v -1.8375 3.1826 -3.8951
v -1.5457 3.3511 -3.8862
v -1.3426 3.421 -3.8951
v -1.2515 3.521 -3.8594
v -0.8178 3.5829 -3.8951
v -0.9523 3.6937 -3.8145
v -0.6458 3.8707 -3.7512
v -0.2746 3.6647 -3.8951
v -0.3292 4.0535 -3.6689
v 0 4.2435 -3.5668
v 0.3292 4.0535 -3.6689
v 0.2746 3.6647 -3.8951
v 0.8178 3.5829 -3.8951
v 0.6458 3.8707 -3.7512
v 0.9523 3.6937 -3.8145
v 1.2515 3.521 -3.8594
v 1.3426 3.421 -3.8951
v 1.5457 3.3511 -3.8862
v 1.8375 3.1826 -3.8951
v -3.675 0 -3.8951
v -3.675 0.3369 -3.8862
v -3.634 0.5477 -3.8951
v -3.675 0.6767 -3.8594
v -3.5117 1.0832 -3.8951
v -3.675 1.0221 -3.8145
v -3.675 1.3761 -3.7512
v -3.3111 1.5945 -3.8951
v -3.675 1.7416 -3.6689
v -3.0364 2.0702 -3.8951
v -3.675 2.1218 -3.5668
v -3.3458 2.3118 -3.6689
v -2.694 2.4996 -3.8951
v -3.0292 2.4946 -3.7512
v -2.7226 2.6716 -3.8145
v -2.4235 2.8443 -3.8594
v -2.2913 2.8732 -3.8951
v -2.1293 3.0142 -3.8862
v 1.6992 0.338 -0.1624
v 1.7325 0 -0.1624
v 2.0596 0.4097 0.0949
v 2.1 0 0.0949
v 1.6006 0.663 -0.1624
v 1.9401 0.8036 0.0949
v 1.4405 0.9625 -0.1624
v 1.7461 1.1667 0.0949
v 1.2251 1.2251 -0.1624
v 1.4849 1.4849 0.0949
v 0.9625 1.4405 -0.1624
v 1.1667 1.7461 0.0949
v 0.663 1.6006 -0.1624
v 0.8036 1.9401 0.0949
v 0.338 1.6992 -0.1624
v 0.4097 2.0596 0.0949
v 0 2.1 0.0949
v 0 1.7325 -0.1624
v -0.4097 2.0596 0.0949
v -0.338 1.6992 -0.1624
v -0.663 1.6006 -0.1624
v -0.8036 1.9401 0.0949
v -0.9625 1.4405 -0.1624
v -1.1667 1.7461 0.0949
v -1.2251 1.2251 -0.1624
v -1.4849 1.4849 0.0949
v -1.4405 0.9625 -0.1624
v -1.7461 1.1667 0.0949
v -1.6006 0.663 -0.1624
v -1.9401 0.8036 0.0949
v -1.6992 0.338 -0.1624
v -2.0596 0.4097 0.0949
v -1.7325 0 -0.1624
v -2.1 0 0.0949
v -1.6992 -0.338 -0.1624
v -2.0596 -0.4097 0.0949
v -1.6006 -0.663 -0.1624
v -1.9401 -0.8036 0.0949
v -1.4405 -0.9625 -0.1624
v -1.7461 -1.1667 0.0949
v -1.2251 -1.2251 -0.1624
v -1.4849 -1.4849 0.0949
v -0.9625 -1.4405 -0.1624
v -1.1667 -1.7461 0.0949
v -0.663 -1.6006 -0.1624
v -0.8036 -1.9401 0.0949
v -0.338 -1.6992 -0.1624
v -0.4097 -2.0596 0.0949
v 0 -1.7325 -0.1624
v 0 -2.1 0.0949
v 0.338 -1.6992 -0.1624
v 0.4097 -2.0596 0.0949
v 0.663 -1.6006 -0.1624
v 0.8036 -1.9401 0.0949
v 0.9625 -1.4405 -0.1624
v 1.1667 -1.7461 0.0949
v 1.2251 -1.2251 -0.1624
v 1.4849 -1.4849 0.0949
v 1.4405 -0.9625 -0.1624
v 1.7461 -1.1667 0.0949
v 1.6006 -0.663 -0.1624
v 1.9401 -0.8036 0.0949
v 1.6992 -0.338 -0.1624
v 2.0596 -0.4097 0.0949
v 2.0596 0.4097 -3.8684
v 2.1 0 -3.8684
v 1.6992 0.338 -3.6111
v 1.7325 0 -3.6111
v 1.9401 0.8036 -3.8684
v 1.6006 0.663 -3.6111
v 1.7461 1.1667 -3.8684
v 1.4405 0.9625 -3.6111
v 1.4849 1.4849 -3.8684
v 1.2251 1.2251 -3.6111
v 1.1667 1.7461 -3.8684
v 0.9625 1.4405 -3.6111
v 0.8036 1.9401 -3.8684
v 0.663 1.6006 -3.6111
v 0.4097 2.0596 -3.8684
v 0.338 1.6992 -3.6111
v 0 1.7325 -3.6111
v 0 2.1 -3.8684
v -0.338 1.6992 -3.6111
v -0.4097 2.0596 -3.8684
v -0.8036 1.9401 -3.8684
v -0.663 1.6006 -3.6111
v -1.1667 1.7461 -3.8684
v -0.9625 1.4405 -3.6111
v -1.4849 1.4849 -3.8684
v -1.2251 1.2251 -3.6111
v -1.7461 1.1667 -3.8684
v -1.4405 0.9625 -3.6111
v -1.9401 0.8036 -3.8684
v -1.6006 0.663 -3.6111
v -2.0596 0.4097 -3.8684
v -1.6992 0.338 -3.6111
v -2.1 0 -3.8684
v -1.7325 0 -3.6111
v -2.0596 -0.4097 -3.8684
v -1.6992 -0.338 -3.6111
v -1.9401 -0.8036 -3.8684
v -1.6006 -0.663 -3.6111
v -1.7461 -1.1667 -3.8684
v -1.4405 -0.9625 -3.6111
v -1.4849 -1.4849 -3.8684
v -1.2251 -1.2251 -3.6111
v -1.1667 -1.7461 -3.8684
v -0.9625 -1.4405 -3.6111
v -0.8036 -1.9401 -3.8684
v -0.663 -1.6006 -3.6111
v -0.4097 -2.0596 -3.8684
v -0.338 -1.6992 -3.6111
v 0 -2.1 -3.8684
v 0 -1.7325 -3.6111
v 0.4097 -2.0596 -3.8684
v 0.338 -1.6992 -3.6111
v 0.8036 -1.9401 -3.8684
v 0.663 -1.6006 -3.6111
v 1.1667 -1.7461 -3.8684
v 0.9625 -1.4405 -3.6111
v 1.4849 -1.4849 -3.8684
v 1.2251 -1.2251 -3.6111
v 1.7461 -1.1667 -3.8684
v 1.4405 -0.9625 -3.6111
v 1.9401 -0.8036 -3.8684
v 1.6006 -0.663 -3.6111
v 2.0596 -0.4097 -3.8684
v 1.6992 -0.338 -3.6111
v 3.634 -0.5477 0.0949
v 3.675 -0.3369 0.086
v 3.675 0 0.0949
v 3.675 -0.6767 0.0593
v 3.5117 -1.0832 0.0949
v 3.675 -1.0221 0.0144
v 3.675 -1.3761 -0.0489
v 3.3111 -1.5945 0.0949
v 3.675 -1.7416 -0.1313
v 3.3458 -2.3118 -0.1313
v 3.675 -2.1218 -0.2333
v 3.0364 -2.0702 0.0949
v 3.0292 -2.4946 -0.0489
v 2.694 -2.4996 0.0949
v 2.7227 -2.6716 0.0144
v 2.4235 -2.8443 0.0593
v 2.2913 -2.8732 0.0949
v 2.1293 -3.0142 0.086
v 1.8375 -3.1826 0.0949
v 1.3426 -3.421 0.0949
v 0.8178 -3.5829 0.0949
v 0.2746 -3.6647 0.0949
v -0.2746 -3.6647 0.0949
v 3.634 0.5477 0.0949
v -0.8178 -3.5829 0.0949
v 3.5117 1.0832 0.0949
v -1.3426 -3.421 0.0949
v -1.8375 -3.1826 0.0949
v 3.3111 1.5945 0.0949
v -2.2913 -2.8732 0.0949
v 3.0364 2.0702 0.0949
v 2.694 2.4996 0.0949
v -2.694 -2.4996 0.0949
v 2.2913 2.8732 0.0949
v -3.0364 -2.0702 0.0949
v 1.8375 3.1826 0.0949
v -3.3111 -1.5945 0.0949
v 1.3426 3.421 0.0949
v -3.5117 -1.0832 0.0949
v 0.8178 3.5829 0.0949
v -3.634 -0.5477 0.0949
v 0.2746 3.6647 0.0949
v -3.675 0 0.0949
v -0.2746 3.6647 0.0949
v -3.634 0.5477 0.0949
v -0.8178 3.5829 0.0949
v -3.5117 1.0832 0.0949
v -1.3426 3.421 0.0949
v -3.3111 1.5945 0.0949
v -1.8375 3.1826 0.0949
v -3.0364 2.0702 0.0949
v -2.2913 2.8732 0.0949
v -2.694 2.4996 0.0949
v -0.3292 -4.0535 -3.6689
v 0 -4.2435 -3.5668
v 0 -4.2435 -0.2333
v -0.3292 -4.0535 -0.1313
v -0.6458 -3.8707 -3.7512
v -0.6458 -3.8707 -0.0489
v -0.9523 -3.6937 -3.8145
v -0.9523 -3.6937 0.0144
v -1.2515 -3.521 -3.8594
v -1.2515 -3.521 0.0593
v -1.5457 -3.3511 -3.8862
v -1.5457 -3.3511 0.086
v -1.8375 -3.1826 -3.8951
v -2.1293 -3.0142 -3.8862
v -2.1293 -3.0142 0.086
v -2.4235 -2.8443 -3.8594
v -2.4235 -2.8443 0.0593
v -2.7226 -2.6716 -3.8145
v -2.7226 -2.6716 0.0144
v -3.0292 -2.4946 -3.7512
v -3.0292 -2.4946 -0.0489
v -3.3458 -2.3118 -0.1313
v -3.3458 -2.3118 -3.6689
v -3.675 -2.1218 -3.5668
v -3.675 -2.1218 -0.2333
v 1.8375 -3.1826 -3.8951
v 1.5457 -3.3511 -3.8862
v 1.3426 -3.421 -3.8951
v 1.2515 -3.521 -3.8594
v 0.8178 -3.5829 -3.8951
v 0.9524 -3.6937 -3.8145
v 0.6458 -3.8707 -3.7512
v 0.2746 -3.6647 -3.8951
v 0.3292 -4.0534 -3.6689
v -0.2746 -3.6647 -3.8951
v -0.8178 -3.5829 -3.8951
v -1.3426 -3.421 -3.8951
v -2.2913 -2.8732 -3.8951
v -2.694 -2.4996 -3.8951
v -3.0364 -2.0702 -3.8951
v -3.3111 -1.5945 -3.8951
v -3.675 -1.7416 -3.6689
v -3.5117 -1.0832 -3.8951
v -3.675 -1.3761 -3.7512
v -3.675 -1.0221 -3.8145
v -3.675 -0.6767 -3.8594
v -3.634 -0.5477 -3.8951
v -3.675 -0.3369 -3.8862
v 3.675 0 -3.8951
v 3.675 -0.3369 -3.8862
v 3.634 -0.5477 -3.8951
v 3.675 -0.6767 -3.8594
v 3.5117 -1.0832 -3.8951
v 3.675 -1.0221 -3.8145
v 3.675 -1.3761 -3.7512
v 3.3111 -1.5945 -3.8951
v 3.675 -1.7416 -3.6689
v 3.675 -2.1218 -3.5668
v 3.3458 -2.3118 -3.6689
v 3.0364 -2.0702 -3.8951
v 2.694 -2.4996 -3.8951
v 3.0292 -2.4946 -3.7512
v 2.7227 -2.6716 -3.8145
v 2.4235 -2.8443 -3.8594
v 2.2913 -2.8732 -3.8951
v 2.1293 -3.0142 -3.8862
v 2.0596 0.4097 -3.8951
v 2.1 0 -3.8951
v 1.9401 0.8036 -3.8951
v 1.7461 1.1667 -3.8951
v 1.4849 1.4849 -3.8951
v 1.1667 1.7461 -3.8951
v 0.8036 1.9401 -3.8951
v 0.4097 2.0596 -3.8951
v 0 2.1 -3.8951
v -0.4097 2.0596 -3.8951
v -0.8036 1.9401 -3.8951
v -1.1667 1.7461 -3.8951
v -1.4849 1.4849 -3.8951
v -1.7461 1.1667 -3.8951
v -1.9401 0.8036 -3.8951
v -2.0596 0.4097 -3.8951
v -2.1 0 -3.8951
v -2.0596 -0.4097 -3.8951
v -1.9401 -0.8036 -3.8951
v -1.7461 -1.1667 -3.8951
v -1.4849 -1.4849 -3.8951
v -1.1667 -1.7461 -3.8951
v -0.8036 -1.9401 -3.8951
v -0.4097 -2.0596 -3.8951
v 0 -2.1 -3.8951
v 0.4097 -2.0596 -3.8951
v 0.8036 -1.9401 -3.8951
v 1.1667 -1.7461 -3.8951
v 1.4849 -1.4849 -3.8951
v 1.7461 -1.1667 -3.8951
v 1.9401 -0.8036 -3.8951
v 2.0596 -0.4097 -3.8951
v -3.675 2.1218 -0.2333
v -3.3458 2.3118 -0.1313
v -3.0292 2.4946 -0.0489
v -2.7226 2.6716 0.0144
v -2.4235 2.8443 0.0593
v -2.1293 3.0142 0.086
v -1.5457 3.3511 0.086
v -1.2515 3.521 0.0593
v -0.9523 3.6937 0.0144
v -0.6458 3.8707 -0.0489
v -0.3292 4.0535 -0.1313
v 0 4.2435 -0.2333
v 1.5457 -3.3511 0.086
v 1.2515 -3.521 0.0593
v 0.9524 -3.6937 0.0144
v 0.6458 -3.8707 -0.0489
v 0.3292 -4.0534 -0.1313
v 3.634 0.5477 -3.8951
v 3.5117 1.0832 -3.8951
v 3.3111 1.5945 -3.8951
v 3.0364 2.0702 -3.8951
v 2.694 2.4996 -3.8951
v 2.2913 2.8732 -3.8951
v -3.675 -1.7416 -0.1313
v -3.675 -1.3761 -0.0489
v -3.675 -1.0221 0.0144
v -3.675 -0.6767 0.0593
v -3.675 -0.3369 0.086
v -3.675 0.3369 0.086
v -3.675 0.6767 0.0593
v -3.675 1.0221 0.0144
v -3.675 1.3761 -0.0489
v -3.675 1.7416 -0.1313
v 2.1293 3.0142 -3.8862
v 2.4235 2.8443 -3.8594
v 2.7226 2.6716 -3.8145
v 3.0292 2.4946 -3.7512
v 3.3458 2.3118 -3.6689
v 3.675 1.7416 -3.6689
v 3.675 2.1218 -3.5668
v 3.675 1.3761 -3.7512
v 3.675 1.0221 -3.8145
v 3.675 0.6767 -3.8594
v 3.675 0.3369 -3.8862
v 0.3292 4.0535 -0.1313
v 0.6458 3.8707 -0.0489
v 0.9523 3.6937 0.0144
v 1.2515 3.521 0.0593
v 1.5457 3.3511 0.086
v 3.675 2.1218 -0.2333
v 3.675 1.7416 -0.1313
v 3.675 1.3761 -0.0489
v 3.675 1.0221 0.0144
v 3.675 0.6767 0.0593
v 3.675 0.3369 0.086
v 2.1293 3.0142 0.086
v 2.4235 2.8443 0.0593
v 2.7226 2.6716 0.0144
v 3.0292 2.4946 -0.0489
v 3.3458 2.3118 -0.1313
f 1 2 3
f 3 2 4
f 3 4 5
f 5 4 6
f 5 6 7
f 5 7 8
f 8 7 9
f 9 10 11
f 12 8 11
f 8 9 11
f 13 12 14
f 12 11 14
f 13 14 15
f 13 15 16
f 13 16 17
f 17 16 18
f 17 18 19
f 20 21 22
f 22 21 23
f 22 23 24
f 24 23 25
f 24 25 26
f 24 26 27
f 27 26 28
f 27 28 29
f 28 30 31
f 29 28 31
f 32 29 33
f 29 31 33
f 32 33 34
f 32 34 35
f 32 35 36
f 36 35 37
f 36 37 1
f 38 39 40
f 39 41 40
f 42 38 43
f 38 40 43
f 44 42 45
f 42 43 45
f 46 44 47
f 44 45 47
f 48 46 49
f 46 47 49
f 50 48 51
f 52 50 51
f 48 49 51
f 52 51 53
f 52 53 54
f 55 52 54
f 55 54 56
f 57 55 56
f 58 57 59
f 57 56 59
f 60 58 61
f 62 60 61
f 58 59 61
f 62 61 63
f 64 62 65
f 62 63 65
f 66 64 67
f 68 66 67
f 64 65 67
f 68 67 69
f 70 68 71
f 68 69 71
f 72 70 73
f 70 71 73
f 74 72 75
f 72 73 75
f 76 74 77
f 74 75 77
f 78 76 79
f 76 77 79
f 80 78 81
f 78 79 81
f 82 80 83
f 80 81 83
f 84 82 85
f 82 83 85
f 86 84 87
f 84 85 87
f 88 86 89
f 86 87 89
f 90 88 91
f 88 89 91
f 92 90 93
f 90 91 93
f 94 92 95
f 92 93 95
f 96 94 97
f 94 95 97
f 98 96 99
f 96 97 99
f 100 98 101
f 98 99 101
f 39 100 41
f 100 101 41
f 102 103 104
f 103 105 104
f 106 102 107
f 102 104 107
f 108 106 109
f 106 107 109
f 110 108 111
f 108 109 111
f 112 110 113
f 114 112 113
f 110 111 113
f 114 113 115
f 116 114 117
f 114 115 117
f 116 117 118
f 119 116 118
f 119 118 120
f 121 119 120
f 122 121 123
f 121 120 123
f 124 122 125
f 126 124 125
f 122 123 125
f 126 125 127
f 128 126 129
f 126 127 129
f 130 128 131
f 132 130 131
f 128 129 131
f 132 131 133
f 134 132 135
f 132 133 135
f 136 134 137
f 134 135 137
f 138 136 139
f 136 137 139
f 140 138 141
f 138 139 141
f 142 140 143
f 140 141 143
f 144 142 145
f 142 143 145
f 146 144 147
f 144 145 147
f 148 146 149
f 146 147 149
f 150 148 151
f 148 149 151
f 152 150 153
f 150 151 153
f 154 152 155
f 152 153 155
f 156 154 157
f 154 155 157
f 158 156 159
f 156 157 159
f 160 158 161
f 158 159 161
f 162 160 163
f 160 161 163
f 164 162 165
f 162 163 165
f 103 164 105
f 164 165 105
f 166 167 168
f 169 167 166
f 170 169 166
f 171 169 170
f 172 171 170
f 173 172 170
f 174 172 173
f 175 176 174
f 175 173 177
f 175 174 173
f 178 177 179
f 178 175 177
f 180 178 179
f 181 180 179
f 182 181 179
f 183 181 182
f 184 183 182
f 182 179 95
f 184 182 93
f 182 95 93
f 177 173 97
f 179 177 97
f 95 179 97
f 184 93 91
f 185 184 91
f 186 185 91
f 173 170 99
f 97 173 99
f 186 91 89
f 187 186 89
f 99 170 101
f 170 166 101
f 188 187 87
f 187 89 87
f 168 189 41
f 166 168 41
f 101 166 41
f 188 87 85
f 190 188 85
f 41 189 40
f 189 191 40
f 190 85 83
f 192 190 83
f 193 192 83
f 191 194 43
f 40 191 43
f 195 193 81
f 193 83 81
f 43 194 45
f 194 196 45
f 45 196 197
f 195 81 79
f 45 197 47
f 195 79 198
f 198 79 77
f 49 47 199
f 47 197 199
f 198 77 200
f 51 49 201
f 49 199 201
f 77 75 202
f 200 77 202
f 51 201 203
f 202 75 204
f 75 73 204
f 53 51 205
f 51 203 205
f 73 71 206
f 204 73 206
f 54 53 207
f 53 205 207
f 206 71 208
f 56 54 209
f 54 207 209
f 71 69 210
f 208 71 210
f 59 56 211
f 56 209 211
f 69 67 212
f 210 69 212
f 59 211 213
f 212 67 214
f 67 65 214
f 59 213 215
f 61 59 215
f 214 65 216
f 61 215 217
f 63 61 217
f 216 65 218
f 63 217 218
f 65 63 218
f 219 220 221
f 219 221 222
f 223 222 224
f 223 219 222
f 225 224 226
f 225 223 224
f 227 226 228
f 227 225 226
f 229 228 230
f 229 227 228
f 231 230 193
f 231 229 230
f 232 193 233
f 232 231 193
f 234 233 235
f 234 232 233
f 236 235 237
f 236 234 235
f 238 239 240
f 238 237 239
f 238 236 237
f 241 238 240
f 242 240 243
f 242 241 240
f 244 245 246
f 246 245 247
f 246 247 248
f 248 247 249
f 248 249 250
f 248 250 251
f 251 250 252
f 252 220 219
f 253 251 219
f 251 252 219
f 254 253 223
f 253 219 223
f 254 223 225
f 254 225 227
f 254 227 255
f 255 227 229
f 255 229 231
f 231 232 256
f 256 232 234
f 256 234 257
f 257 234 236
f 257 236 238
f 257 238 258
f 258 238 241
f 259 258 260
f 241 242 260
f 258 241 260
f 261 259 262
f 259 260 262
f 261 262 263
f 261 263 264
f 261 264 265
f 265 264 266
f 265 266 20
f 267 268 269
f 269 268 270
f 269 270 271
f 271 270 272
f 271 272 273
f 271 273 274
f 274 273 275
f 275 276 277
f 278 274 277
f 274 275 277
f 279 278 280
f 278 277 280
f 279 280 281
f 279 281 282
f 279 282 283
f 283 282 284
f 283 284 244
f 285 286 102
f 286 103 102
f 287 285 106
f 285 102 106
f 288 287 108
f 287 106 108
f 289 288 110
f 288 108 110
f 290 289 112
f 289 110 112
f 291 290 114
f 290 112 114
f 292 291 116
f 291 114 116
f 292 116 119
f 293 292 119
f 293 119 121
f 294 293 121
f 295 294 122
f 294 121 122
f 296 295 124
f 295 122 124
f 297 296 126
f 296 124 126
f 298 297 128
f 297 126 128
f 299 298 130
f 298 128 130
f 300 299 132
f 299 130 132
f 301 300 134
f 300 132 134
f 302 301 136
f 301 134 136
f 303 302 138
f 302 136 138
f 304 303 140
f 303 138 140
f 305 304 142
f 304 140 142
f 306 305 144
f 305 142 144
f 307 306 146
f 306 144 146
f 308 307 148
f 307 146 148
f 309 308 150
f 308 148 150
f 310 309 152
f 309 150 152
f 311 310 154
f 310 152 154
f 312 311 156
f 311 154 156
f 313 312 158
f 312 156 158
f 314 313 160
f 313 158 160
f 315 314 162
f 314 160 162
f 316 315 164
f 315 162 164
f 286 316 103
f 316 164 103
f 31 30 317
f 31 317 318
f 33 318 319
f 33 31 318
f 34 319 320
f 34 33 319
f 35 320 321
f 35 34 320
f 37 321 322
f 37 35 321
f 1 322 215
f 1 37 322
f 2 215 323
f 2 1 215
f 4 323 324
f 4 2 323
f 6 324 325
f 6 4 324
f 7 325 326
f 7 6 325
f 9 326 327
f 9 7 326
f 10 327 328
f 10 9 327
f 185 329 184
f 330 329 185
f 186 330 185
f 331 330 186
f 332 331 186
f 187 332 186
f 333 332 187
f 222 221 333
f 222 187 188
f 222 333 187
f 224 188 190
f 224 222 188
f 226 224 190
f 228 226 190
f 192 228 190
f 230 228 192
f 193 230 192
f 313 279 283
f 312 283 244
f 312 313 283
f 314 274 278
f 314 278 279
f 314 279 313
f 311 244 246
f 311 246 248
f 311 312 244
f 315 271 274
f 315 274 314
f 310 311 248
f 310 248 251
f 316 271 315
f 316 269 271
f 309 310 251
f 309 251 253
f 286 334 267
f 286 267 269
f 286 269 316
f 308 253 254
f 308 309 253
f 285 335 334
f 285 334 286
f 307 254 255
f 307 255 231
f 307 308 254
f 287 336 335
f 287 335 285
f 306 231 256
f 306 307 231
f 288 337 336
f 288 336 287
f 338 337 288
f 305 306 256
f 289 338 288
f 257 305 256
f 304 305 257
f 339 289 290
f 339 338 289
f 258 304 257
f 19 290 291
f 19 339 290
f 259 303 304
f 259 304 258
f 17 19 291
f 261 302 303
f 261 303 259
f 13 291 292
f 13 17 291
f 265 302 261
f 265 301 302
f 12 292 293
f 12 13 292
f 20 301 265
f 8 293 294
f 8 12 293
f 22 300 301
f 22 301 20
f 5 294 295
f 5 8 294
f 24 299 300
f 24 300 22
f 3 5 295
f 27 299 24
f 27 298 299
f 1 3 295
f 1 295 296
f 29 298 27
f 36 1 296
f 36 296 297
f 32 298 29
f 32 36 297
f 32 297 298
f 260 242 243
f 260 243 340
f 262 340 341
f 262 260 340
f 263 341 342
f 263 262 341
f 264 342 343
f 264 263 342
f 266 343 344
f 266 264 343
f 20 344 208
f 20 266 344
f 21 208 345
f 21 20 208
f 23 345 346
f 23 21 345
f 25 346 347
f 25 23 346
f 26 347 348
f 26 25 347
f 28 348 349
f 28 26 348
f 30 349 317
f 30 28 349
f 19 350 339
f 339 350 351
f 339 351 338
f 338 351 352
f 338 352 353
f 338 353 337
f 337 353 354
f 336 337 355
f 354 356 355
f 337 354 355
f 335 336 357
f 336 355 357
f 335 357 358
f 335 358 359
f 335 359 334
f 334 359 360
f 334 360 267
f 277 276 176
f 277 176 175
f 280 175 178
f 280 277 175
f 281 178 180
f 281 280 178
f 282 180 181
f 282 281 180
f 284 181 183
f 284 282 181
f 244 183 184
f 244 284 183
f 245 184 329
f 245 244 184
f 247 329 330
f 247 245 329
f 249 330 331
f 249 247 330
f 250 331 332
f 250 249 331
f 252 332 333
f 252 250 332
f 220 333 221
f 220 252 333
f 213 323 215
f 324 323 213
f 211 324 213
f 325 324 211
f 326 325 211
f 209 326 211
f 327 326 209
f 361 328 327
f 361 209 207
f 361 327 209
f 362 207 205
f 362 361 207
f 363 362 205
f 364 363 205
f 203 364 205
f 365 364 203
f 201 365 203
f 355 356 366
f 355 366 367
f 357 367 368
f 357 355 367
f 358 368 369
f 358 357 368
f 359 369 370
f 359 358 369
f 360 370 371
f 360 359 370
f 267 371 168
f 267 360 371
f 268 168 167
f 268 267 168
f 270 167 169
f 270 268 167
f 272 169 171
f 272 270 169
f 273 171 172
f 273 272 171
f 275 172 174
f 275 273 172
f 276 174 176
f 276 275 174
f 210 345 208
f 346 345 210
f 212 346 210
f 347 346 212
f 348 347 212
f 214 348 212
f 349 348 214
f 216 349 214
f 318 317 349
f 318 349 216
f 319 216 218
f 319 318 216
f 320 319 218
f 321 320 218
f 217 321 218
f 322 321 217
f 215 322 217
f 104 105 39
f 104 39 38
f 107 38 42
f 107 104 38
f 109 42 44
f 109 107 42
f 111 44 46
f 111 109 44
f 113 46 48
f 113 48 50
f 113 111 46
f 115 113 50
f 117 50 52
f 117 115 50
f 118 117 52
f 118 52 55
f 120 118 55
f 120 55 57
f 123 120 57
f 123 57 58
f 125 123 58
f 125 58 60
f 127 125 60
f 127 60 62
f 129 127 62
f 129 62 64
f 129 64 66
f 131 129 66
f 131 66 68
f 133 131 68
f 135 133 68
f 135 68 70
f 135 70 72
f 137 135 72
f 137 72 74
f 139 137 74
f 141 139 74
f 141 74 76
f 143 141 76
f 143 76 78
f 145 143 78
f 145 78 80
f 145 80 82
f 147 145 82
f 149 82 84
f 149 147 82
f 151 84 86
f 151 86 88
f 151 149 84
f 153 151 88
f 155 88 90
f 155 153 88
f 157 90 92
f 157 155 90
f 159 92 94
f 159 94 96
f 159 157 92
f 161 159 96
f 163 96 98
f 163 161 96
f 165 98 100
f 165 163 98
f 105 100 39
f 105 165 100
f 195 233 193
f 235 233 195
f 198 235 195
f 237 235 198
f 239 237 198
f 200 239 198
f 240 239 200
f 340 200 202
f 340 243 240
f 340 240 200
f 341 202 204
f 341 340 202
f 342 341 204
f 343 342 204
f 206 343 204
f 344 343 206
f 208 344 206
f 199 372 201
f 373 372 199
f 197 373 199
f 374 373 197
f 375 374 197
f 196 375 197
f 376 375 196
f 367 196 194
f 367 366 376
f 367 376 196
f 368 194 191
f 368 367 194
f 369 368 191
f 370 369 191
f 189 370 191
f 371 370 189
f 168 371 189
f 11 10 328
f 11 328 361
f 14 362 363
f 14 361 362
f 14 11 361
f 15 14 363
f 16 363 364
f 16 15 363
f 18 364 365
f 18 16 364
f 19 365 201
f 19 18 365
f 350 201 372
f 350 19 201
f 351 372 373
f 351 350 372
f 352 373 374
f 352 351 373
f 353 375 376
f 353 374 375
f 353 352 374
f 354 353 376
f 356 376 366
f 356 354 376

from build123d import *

# Parameters (mm, degrees)
BASENUT_START = -3.8
BASENUTSKE_R  = 1.65
BASENUT_DEPTH = 3.8
SCALA1_SCALE  = 1.05


# Read off the part's stored shape, not the designer's step: ThreadSchematic
with BuildPart() as part:
    # BaseNutSke → BaseNut (new body)
    with BuildSketch(Plane.XY.offset(BASENUT_START)):
        Polygon((3.5, 2.020725942), (3.5, -2.020725942), (0, -4.041451884), (-3.5, -2.020725942), (-3.5, 2.020725942), (0, 4.041451884), align=None)
        Circle(BASENUTSKE_R, mode=Mode.SUBTRACT)
    extrude(amount=BASENUT_DEPTH)

    # Sketch5 (on Front Plane) → EndChamfer (revolve, cut)
    with BuildSketch(Plane.XY):
        Polygon((3.7746, 2), (3.505020098, 1.615), (3.8254, 1.615), (3.8254, 2), align=None)
    revolve(axis=Axis((3.7746, 2, 0), (-0.5735764363510472, -0.8191520442889912, 0)), mode=Mode.SUBTRACT)

    # Sketch3 → Double-Chamfer (revolve, cut)
    with BuildSketch(Plane(origin=(0, 0, 0), x_dir=(0, 0, -1), z_dir=(1, 0, 0))):
        Polygon((3.8, 3.5), (3.487392609, 4.041451884), (3.487392609, 14.041451884), (13.8, 14.041451884), (13.8, 3.5), align=None)
        Polygon((0.312607391, 14.041451884), (-10, 14.041451884), (-10, 3.5), (0, 3.5), (0.312607391, 4.041451884), align=None)
    revolve(axis=Axis((0, 0, 0), (0, 0, -1)), mode=Mode.SUBTRACT)

    # ThreadSchematic outline → ThreadSchematic (revolve, cut)
    with BuildSketch(Plane.XZ):
        Polygon((1.65, 0), (1.65, -0.245072638), (2, 0), align=None)
        Polygon((2, -3.7746), (1.65, -3.529527362), (1.65, -3.8), (2, -3.8), align=None)
    revolve(axis=Axis((0, 0, 0), (0, 0, 1)), mode=Mode.SUBTRACT)


with BuildPart() as part_1:
    # Scala1: scaled about (0, 0, -1.898579805)
    add(part.part.scale(SCALA1_SCALE).moved(Location((0, 0, 0.09492899))))


solid = part_1.part
